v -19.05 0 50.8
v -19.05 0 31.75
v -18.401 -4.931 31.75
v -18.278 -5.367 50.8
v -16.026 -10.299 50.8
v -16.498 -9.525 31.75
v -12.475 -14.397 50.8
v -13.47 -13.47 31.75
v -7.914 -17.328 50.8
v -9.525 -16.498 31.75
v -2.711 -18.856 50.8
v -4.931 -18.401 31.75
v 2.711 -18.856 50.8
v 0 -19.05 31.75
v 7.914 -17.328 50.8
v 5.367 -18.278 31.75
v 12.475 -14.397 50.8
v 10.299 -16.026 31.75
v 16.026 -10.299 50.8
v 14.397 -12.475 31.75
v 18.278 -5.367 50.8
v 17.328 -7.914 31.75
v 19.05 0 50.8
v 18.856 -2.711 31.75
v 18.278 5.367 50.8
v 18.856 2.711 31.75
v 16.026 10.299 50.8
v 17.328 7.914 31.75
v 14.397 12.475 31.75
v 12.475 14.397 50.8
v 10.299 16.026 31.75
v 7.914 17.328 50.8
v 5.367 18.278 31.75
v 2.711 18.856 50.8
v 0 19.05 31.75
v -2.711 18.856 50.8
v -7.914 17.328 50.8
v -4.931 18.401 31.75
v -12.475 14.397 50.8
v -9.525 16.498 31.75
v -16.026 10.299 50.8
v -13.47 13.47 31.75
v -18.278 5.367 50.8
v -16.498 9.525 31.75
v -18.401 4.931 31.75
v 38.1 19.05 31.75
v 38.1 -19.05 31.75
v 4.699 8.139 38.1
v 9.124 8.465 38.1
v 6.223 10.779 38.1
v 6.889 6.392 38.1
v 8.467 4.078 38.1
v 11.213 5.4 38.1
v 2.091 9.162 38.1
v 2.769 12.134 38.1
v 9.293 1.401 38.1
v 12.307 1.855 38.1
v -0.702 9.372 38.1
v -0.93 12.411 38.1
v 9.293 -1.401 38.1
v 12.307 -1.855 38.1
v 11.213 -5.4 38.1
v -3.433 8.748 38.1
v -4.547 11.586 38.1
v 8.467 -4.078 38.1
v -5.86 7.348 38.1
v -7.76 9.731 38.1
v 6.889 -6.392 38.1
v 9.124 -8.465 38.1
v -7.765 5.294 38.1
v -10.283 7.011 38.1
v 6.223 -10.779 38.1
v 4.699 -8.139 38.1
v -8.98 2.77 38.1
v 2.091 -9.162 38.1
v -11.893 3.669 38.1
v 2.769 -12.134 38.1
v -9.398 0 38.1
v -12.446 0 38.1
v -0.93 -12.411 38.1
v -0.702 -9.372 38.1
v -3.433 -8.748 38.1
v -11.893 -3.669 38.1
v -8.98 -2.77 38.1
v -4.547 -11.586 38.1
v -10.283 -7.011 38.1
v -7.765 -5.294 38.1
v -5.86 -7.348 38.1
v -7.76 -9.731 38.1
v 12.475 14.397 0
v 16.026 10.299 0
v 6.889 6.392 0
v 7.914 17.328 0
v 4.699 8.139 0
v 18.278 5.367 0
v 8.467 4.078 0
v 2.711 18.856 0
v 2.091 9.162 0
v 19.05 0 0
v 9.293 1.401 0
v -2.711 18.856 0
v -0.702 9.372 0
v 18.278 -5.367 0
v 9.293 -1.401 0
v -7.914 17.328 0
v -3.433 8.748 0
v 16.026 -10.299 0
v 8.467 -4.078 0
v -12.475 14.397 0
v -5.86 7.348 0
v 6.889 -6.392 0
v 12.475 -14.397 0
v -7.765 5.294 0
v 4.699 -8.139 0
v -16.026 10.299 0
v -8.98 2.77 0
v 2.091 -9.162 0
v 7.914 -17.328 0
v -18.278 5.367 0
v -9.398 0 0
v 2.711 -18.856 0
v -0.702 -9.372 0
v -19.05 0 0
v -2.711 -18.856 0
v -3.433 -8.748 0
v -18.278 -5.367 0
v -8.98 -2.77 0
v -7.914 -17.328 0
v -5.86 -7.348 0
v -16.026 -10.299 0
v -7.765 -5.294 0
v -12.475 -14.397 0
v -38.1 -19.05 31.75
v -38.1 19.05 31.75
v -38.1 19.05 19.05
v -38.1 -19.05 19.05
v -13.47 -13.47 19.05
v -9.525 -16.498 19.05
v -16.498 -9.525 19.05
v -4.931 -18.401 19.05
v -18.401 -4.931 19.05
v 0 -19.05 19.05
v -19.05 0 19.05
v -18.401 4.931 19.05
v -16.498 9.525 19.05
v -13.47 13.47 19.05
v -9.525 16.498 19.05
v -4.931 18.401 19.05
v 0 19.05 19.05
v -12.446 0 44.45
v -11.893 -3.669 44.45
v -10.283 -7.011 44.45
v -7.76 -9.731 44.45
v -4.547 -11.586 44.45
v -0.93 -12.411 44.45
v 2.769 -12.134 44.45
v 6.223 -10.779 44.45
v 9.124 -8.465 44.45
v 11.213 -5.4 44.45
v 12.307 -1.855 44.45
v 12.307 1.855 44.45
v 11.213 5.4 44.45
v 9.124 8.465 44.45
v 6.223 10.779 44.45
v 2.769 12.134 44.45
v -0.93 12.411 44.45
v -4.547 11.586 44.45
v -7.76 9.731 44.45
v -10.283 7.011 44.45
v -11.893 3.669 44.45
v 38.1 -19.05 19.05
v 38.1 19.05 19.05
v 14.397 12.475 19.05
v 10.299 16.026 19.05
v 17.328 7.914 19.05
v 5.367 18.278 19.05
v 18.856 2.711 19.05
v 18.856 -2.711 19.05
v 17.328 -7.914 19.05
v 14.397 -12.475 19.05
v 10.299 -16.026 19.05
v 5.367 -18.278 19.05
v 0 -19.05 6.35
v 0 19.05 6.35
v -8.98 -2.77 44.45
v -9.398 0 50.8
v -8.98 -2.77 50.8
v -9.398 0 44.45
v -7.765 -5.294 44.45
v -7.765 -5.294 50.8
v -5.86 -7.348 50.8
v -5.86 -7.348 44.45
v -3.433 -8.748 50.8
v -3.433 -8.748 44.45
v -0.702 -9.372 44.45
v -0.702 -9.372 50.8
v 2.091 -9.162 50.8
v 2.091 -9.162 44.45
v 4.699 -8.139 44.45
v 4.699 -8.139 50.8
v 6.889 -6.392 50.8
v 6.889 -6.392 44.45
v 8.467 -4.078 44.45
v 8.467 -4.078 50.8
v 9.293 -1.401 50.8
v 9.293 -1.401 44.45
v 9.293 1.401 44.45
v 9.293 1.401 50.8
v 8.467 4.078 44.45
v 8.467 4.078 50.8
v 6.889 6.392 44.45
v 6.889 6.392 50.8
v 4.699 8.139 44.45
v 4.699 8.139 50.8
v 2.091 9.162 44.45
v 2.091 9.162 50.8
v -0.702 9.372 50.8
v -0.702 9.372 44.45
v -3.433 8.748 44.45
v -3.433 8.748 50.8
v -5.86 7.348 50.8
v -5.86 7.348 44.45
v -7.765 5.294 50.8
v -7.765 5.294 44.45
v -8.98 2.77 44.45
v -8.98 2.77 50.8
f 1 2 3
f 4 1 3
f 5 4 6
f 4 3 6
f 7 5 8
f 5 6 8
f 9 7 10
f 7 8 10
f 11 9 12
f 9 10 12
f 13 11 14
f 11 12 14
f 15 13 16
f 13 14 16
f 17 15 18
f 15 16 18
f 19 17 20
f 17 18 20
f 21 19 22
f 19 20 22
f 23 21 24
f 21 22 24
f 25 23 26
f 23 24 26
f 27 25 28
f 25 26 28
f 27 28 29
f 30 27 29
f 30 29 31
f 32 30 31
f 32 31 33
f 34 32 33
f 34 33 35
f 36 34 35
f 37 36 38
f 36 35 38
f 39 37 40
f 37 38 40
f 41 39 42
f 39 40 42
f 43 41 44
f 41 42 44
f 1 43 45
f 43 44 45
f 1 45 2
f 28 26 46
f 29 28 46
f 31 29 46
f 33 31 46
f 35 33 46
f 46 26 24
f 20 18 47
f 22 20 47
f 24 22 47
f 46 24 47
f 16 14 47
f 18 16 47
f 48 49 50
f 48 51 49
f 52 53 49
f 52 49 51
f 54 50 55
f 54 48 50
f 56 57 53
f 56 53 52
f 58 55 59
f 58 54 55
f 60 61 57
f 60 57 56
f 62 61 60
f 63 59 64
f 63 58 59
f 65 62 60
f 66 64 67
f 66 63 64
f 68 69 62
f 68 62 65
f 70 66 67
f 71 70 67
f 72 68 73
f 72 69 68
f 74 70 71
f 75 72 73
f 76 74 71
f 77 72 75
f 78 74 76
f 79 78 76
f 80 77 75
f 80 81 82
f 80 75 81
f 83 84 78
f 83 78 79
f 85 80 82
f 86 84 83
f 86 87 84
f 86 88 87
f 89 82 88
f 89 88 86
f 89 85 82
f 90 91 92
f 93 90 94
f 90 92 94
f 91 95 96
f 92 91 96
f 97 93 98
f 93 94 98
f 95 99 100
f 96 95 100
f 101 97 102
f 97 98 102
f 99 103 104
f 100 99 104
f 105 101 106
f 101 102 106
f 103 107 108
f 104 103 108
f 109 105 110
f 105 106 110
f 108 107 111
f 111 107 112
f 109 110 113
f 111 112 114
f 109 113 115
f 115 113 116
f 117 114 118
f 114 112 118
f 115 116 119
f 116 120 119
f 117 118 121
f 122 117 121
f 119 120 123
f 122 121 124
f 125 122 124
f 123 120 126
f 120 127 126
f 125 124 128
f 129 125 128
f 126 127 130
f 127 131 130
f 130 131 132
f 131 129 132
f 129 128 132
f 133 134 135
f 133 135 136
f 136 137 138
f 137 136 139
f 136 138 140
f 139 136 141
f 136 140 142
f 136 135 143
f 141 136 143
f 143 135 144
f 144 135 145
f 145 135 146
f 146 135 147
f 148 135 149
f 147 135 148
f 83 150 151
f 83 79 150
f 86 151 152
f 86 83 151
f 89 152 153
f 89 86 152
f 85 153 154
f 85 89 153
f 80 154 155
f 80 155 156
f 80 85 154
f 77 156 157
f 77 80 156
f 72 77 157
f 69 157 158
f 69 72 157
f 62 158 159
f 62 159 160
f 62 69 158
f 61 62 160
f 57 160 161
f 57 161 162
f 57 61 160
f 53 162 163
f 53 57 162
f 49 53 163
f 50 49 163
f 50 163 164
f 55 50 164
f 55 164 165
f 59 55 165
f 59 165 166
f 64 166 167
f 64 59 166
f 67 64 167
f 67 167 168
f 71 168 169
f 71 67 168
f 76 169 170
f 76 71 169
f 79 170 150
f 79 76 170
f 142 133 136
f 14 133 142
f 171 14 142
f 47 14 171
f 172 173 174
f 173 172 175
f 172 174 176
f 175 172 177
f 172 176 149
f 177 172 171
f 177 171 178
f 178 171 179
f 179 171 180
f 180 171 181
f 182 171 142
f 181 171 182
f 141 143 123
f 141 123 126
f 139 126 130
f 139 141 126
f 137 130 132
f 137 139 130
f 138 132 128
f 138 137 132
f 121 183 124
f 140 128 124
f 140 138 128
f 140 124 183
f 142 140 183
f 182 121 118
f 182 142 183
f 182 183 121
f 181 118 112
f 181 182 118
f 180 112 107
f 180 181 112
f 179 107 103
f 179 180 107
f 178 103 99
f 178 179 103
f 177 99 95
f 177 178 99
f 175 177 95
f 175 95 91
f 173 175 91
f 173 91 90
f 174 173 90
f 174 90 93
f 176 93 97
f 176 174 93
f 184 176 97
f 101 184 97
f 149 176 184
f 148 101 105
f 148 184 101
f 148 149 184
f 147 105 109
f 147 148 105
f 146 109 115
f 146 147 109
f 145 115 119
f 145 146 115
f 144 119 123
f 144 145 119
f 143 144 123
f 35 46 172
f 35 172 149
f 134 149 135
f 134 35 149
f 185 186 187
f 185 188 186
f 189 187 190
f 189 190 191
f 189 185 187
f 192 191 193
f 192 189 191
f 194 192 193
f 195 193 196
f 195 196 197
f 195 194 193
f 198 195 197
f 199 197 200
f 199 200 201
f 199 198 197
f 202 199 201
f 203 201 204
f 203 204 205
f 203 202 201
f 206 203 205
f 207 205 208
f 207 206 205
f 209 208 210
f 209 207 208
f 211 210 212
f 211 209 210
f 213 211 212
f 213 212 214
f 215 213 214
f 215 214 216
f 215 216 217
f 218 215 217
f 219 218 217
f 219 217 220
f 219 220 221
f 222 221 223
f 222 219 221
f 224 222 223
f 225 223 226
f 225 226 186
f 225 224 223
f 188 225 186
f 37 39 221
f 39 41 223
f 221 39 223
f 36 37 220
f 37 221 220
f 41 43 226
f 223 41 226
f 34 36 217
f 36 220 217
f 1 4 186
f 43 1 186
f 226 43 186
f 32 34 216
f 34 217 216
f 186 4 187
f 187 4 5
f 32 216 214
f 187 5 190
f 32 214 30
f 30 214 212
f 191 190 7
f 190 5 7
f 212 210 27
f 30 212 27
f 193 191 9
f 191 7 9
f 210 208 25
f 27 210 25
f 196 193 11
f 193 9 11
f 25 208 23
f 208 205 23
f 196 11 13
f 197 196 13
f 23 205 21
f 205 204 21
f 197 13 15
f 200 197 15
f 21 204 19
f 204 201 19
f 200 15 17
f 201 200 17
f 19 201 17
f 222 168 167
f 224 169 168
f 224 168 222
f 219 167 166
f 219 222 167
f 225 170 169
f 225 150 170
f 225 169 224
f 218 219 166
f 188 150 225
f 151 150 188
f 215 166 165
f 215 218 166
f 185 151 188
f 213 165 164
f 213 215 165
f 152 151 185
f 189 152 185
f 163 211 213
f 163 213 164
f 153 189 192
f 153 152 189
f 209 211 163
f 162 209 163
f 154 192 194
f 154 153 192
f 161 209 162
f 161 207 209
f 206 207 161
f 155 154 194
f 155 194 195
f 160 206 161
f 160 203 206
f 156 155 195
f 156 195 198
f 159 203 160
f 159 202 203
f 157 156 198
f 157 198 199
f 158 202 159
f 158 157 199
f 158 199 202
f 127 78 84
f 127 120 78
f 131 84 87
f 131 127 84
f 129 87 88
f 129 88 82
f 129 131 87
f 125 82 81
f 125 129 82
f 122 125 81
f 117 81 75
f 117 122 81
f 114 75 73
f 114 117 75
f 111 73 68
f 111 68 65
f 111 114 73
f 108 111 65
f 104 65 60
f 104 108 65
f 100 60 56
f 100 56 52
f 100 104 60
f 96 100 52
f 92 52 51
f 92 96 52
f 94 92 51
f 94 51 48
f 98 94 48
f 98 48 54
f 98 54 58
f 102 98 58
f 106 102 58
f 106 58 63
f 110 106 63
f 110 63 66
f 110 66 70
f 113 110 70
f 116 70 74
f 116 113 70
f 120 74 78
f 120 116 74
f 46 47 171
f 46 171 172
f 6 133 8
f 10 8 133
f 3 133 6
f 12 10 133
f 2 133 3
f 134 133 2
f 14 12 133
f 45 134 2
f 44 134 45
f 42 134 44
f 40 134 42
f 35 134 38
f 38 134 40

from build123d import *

# Parameters (mm, degrees)
F0_W     = 9.398
F0_H     = 19.05
F0_H_2   = 12.7
F0_W_2   = 9.652
F3_DEPTH = 25.4
F5_DEPTH = 12.7


with BuildPart() as f1:
    # F0 (on Front) → F1 (revolve)
    with BuildSketch(Plane.XZ):
        with Locations((-4.699, 9.525)):
            Rectangle(F0_W, F0_H)
        with Locations((-4.699, 25.4)):
            Rectangle(F0_W, F0_H_2)
        with Locations((-14.224, 9.525)):
            Rectangle(F0_W_2, F0_H)
        Polygon((-9.398, 31.75), (0, 31.75), (0, 50.8), (-9.398, 50.8), (-9.398, 44.45), (-12.446, 44.45), (-12.446, 38.1), (-9.398, 38.1), align=None)
        Polygon((-19.05, 19.05), (-9.398, 19.05), (-9.398, 31.75), (-19.05, 31.75), (-38.1, 31.75), (-38.1, 19.05), align=None)
        Polygon((-19.05, 31.75), (-9.398, 31.75), (-9.398, 38.1), (-12.446, 38.1), (-12.446, 44.45), (-9.398, 44.45), (-9.398, 50.8), (-19.05, 50.8), align=None)
    revolve(axis=Axis((0, 0, 25.4), (0, 0, 1)))

    # F2 (on face) → F3 (cut)
    with BuildSketch(Plane.XY.offset(31.75)):
        with BuildLine():
            Line((3.68e-08, 19.05), (32.9955678842, 19.05))
            ThreePointArc((32.9955678842, 19.05), (0, 38.1), (-32.9955678842, 19.05))
            Line((-32.9955678842, 19.05), (3.68e-08, 19.05))
        make_face()
        with BuildLine():
            ThreePointArc((-32.9955678842, -19.05), (0, -38.1), (32.9955678842, -19.05))
            Line((32.9955678842, -19.05), (3.68e-08, -19.05))
            Line((3.68e-08, -19.05), (-32.9955678842, -19.05))
        make_face()
    extrude(amount=-F3_DEPTH, mode=Mode.SUBTRACT)

    # F4 (on face) → F5 (join, through all)
    with BuildSketch(Plane.XY.offset(31.75)):
        with BuildLine():
            Line((-38.1, 19.05), (-38.1, 0))
            ThreePointArc((-38.1, 0), (-36.8017739816, 9.8610056184), (-32.9955678842, 19.05))
            Line((-32.9955678842, 19.05), (-38.1, 19.05))
        make_face()
        with BuildLine():
            ThreePointArc((-32.9955678842, -19.05), (-36.8017739816, -9.8610056184), (-38.1, 0))
            Line((-38.1, 0), (-38.1, -19.05))
            Line((-38.1, -19.05), (-32.9955678842, -19.05))
        make_face()
        with BuildLine():
            ThreePointArc((32.9955678842, 19.05), (36.8017739816, 9.8610056184), (38.1, 0))
            Line((38.1, 0), (38.1, 19.05))
            Line((38.1, 19.05), (32.9955678842, 19.05))
        make_face()
        with BuildLine():
            Line((38.1, -19.05), (38.1, 0))
            ThreePointArc((38.1, 0), (36.8017739816, -9.8610056184), (32.9955678842, -19.05))
            Line((32.9955678842, -19.05), (38.1, -19.05))
        make_face()
    extrude(amount=-F5_DEPTH)

    # F6 (on Front) → F7 (revolve, cut)
    with BuildSketch(Plane.XZ):
        Polygon((0, 50.8), (-9.398, 50.8), (-9.398, 44.45), (-12.446, 44.45), (-12.446, 38.1), (-9.398, 38.1), (-9.398, 0), (0, 0), align=None)
    revolve(axis=Axis((0, 0, 25.4), (0, 0, 1)), mode=Mode.SUBTRACT)


solid = f1.part
